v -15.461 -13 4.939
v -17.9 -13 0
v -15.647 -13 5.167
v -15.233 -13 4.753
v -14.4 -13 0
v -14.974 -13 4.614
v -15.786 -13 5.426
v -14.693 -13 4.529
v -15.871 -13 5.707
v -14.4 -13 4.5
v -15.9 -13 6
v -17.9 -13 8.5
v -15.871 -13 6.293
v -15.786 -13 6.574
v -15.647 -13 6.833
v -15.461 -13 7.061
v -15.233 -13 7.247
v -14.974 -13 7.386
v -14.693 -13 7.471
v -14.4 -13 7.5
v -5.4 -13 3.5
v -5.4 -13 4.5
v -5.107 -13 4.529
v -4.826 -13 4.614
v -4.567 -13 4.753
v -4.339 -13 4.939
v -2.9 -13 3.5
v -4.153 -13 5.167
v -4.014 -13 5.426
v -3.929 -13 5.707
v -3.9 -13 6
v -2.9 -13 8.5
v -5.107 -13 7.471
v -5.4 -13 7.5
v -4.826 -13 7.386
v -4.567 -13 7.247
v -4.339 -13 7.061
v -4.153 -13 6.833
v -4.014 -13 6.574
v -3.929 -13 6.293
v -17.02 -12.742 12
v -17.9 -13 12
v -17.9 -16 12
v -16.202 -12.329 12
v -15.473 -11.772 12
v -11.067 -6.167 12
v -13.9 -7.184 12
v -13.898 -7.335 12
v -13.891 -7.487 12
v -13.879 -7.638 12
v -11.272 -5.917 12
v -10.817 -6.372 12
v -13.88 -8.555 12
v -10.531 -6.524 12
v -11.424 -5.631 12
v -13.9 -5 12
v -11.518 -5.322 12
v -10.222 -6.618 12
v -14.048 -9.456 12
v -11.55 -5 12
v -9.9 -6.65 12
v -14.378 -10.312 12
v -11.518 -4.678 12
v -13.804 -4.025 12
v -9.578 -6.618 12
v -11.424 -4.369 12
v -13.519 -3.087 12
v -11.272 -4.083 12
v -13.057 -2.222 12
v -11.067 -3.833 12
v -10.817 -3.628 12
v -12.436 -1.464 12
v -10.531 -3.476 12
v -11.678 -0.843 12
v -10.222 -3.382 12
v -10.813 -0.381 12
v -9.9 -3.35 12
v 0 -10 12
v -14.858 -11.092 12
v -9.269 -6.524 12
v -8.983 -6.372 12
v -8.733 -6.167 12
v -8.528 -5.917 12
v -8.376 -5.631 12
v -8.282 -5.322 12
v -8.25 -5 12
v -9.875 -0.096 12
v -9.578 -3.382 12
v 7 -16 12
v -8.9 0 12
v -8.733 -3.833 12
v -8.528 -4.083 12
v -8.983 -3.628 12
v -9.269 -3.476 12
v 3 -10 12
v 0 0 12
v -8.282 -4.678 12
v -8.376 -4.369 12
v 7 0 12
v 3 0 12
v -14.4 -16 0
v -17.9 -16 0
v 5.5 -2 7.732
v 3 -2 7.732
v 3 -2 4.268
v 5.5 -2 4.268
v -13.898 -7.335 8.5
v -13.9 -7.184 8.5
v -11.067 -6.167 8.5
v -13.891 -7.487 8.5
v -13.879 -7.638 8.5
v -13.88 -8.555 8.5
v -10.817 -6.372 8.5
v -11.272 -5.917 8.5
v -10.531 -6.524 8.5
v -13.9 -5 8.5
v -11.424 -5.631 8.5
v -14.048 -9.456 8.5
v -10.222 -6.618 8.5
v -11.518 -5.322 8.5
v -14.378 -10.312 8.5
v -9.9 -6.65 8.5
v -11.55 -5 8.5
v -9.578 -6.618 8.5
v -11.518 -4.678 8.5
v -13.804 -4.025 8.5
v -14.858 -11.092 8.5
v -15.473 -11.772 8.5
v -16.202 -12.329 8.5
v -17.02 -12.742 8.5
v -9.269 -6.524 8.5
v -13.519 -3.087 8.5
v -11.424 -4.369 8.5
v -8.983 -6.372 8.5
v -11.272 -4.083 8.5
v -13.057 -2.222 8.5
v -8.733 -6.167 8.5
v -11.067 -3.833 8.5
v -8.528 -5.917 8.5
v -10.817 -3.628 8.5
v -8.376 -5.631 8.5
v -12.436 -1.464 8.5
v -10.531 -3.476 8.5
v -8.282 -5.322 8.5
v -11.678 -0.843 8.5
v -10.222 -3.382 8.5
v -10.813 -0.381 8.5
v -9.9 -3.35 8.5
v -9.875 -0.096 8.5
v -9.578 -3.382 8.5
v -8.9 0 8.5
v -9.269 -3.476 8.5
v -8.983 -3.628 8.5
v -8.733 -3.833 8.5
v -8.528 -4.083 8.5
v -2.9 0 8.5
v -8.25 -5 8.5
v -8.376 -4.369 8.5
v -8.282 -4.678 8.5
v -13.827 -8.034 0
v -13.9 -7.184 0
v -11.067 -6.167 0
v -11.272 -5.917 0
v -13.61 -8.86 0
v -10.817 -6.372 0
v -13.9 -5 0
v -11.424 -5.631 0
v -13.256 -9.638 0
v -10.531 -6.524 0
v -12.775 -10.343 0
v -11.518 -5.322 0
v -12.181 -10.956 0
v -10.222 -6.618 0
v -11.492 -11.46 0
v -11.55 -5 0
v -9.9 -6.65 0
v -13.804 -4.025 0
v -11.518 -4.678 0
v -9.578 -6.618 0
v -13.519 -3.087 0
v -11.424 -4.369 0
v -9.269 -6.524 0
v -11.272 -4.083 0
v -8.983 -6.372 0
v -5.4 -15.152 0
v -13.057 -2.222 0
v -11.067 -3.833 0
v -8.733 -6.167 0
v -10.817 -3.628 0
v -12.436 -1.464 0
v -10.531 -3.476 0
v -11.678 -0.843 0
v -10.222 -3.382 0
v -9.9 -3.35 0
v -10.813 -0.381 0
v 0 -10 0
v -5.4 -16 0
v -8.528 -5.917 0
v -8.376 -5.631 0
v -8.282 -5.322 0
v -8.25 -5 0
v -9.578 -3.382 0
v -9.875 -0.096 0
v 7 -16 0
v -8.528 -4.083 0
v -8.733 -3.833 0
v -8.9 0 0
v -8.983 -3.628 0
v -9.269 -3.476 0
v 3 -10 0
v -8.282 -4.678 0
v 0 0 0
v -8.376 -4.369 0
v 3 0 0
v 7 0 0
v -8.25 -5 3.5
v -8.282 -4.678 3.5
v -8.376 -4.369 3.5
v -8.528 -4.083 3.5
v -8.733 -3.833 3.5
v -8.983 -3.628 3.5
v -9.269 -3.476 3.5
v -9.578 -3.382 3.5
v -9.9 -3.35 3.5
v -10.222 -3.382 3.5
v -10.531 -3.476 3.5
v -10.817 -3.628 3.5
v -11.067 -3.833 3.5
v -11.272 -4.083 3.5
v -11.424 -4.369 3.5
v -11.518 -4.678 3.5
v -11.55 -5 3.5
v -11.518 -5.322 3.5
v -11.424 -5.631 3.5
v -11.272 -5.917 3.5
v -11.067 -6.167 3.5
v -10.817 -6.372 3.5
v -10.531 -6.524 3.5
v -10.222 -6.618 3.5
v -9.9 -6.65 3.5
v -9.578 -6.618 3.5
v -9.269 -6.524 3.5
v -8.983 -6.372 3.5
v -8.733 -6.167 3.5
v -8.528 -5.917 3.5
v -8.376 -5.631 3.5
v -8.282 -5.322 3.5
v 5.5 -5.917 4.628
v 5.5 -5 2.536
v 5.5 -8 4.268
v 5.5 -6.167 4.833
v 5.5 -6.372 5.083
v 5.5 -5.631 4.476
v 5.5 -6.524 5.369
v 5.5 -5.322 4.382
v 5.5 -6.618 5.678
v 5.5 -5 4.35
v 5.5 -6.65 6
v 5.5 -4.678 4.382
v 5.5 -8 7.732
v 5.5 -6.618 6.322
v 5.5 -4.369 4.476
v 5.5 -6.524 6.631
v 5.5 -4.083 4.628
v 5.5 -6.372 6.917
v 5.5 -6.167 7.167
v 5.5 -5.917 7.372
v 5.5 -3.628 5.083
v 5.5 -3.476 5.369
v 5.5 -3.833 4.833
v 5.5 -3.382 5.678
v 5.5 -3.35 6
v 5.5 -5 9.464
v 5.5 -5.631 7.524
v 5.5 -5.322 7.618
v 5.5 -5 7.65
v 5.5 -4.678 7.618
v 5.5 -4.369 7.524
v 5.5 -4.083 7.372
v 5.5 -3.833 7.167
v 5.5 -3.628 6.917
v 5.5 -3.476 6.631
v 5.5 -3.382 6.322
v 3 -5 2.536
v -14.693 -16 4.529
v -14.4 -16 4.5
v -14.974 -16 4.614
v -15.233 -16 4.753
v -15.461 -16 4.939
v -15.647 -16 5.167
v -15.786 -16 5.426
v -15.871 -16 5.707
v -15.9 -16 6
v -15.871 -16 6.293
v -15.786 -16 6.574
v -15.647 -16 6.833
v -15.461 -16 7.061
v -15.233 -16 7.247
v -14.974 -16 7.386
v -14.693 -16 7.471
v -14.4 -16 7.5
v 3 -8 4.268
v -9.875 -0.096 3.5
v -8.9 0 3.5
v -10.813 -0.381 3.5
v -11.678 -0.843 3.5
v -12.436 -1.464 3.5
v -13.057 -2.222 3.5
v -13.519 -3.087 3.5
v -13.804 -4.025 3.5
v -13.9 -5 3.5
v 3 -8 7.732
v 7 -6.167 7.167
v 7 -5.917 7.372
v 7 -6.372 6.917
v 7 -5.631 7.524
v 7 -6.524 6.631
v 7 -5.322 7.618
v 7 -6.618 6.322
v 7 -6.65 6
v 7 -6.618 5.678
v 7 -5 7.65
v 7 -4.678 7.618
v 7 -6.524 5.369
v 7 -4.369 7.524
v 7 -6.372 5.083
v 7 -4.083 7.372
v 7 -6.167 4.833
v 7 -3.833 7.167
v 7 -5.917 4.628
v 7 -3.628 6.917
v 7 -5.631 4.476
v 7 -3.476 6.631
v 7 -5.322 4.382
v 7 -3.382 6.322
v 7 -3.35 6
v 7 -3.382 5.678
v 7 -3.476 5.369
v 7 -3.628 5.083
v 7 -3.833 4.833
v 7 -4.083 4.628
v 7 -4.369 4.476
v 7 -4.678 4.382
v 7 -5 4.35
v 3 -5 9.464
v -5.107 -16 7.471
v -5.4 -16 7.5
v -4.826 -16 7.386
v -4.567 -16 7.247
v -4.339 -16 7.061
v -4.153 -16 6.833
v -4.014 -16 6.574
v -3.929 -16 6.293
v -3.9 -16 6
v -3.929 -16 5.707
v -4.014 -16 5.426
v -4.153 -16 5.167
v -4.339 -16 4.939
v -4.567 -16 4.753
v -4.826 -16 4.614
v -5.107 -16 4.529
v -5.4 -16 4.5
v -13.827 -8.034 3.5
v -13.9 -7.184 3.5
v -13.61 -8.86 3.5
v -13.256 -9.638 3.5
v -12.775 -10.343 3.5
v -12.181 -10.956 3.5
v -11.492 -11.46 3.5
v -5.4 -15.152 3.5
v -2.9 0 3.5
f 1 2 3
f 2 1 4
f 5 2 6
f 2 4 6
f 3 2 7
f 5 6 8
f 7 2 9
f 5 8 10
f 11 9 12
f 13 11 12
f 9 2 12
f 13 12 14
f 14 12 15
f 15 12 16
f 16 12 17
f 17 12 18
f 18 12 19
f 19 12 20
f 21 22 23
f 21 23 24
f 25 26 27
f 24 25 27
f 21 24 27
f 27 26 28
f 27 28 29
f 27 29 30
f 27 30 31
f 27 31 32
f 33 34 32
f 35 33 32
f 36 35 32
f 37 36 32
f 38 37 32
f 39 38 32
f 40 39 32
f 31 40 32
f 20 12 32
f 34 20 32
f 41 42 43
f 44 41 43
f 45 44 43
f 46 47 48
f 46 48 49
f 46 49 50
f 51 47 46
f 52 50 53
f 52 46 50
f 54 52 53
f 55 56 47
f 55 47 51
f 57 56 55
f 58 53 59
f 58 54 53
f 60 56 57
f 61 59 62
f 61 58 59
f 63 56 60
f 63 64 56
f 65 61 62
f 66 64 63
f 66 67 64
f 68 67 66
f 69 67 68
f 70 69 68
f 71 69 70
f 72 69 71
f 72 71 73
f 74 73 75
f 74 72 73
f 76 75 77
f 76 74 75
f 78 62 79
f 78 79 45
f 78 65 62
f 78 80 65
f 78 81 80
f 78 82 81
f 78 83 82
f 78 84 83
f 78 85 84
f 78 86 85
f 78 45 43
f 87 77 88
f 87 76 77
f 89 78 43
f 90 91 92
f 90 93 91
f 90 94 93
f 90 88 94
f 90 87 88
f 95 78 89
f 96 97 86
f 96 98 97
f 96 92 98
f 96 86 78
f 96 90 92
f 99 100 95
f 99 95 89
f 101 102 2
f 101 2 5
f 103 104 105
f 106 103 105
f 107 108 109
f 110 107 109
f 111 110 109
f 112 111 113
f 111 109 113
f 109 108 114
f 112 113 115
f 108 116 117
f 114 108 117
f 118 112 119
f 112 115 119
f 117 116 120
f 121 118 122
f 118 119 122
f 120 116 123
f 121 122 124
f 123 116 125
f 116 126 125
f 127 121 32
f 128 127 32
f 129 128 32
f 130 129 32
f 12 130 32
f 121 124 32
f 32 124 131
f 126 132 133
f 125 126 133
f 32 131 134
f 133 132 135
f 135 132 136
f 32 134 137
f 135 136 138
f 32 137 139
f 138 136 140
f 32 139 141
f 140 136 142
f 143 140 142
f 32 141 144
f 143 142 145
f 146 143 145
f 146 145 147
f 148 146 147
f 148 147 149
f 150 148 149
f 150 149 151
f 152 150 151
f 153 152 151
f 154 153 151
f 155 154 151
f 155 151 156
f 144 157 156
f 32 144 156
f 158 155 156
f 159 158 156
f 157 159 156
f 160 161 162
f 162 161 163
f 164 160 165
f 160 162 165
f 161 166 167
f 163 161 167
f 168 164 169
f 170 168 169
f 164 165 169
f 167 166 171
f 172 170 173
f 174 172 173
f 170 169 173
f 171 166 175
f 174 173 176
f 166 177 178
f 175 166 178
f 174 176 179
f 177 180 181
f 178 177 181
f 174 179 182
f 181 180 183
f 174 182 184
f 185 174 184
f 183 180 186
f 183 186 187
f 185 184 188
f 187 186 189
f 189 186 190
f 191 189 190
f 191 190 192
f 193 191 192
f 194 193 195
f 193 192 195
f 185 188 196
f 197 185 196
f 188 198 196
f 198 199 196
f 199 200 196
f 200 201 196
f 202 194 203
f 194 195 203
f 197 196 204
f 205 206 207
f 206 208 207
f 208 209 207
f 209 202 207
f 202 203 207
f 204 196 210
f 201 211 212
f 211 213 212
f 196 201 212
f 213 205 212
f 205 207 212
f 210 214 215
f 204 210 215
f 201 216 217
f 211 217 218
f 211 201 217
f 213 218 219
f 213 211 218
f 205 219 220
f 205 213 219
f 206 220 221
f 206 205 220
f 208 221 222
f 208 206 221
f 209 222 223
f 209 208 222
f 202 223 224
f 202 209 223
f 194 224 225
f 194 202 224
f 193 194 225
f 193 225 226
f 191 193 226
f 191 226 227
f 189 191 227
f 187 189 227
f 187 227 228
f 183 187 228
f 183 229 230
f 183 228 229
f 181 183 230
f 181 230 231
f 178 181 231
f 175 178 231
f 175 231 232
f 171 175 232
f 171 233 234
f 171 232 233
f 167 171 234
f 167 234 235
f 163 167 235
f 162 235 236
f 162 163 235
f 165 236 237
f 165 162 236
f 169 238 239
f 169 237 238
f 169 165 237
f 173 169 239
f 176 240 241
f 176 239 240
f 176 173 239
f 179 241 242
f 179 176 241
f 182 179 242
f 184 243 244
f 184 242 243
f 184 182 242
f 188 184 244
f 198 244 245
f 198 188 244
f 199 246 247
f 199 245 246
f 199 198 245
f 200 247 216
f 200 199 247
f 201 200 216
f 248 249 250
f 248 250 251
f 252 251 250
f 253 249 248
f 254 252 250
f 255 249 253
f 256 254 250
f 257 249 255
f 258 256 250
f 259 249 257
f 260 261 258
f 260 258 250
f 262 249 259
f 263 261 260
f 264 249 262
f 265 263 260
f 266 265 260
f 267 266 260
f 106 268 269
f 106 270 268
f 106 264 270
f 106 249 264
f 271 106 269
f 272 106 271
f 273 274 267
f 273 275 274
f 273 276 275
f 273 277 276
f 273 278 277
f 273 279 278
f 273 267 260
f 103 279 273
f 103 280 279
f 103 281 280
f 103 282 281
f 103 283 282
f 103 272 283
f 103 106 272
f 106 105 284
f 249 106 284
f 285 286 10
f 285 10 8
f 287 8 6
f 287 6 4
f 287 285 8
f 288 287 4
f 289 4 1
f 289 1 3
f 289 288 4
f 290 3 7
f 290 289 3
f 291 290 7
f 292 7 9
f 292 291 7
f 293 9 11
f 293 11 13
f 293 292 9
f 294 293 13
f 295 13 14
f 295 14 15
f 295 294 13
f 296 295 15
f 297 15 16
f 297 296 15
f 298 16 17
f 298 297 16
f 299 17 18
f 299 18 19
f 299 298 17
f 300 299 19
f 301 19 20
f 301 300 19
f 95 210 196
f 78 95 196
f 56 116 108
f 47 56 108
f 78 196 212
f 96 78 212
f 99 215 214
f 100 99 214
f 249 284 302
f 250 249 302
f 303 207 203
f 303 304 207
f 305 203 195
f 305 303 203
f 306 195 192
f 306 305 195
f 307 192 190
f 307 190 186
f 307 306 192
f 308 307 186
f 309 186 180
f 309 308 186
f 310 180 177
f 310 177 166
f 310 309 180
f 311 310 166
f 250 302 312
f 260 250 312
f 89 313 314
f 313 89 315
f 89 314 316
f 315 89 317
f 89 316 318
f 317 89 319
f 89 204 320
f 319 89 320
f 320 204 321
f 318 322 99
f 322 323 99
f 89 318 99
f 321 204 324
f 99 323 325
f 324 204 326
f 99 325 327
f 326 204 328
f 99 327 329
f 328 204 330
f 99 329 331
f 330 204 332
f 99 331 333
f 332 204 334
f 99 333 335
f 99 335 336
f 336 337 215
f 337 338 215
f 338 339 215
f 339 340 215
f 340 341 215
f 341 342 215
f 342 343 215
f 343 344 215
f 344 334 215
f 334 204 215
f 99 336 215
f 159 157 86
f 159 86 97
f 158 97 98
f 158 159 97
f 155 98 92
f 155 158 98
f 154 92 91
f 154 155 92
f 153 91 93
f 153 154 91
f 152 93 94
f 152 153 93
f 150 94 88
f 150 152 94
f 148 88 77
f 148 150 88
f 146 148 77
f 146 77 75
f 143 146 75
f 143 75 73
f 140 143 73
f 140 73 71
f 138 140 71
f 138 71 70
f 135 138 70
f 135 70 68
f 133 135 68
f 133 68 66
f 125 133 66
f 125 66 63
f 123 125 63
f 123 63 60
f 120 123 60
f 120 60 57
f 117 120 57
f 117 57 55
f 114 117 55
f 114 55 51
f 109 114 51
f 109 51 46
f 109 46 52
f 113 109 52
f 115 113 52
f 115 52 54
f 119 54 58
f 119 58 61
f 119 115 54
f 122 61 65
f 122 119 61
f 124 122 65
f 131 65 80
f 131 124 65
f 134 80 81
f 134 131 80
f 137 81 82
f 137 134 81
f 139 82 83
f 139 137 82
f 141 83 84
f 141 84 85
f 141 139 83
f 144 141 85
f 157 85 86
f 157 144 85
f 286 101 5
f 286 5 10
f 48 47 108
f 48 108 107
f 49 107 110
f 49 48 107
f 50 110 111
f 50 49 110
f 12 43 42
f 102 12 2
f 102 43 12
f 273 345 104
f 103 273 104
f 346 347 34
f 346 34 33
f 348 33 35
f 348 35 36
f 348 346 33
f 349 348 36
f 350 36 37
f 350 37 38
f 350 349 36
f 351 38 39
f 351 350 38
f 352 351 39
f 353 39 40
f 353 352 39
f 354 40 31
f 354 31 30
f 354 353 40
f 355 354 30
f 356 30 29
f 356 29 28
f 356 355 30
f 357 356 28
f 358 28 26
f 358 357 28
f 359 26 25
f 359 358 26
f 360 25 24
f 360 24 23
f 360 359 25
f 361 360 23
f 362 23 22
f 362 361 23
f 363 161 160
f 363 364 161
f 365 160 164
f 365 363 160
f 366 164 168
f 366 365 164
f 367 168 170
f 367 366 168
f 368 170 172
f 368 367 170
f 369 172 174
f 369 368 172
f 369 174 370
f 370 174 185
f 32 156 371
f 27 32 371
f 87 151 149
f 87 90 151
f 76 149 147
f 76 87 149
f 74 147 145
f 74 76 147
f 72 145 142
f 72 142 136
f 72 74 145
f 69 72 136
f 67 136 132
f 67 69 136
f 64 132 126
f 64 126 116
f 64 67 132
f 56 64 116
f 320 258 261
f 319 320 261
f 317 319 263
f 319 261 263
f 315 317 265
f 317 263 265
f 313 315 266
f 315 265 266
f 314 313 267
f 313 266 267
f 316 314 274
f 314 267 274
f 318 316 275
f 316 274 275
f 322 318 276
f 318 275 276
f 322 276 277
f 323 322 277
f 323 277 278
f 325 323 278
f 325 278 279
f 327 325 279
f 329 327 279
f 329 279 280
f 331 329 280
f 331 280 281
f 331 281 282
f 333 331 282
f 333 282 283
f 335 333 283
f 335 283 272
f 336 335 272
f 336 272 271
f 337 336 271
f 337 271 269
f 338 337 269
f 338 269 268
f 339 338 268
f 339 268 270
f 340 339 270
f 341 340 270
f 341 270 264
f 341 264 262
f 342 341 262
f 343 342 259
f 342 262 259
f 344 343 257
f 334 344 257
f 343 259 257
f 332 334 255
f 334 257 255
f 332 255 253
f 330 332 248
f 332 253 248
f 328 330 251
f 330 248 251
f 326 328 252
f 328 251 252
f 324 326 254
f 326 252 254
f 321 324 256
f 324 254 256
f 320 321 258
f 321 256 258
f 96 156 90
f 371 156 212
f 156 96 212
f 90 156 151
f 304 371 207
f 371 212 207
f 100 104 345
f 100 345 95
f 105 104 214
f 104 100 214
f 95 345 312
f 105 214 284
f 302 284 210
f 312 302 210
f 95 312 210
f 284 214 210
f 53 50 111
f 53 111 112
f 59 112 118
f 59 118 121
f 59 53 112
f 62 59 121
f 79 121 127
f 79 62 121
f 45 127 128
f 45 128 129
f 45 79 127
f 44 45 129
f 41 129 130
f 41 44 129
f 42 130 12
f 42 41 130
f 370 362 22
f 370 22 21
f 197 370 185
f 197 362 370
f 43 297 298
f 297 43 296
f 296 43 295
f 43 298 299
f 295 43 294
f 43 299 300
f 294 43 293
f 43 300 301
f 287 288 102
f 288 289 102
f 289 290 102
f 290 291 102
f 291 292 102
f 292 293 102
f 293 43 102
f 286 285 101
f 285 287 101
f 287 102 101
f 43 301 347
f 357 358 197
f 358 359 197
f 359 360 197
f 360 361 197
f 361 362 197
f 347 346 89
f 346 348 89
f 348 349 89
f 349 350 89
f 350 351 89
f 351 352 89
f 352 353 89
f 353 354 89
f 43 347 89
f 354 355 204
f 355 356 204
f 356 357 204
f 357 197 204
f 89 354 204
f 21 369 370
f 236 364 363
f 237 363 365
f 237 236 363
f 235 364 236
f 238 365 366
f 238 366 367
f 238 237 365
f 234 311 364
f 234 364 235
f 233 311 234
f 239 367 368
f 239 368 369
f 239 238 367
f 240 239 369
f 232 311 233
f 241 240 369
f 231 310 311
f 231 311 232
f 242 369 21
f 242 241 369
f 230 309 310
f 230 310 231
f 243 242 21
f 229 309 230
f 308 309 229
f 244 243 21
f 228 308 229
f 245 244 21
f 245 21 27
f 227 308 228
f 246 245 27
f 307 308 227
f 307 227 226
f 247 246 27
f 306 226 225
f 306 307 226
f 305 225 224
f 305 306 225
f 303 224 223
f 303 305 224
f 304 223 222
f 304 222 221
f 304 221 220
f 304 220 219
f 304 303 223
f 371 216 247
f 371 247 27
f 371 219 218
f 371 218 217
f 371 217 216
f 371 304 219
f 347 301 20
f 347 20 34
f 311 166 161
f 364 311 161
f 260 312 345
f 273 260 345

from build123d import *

# Parameters (mm, degrees)
ESBO_O1_R                = 1.65
RESSALTO_EXTRUS_O1_DEPTH = 12
ESBO_O2_W                = 11
ESBO_O2_H                = 5
CORTE_EXTRUS_O1_DEPTH    = 25.355902775
FILETE1_R                = 5
ESBO_O3_R                = 1.65
CORTE_EXTRUS_O2_DEPTH    = 2.5
ESBO_O3_2_R              = 1.65
CORTE_EXTRUS_O3_DEPTH    = 27.184155514
RESSALTO_EXTRUS_O2_DEPTH = 3
FILETE2_R                = 5


with BuildPart() as part:
    # Esboço1 → Ressalto-extrusão1 (new body)
    with BuildSketch(Plane.XY):
        Polygon((0, 0), (-13.9, 0), (-13.9, -10), (-4, -16), (7, -16), (7, 0), (3, 0), (3, -10), (0, -10), align=None)
        with Locations((-9.9, -5)):
            Circle(ESBO_O1_R, mode=Mode.SUBTRACT)
    extrude(amount=RESSALTO_EXTRUS_O1_DEPTH)

    # Esboço2 → Corte-extrusão1 (cut, through all)
    with BuildSketch(Plane(origin=(0, 0, 0), x_dir=(1, 0, 0), z_dir=(0, 1, 0))):
        with Locations((-8.4, -6)):
            Rectangle(ESBO_O2_W, ESBO_O2_H)
    extrude(amount=-CORTE_EXTRUS_O1_DEPTH, mode=Mode.SUBTRACT)

    # Filete1
    filete1_edges = [part.edges().sort_by_distance(p)[0] for p in [
        (-4, -16, 1.75),
        (-13.9, -10, 10.25),
        (-13.9, -10, 1.75),
        (-13.9, 0, 1.75),
        (-13.9, 0, 10.25),
    ]]
    fillet(filete1_edges, radius=FILETE1_R)

    # Esboço3 → Corte-extrusão2 (cut)
    with BuildSketch(Plane.ZY.offset(-3)):
        Polygon((2.535898385, -5), (4.267949192, -8), (7.732050808, -8), (9.464101615, -5), (7.732050808, -2), (4.267949192, -2), align=None)
        with Locations(Location((6, -5, 0), (0, 0, 270))):
            Circle(ESBO_O3_R, mode=Mode.SUBTRACT)
    extrude(amount=-CORTE_EXTRUS_O2_DEPTH, mode=Mode.SUBTRACT)

    # Esboço3<2> → Corte-extrusão3 (cut, through all)
    with BuildSketch(Plane.ZY.offset(-3)):
        with Locations(Location((6, -5, 0), (0, 0, 270))):
            Circle(ESBO_O3_2_R)
    extrude(amount=-CORTE_EXTRUS_O3_DEPTH, mode=Mode.SUBTRACT)

    # Esboço4 → Ressalto-extrusão2 (add)
    with BuildSketch(Plane.XZ.offset(16)):
        with BuildLine():
            Line((7, 12), (-17.9, 12))
            Line((-17.9, 12), (-17.9, 0))
            Line((-17.9, 0), (-14.4, 0))
            Line((-14.4, 0), (-14.4, 4.5))
            ThreePointArc((-14.4, 4.5), (-15.9, 6), (-14.4, 7.5))
            Line((-14.4, 7.5), (-5.4, 7.5))
            ThreePointArc((-5.4, 7.5), (-3.9, 6), (-5.4, 4.5))
            Line((-5.4, 4.5), (-5.4, 0))
            Line((-5.4, 0), (7, 0))
            Line((7, 0), (7, 12))
        make_face()
    extrude(amount=-RESSALTO_EXTRUS_O2_DEPTH)

    # Filete2
    # the kernel refuses this fillet: 5 mm, written as the material it adds along each edge
    with BuildSketch(Plane(origin=(-8.95, -13, 12), x_dir=(-1, 0, 0), z_dir=(0, 0, -1))) as filete2_piece_1:
        with BuildLine():
            CenterArc((9.908595848, 4.907249128), FILETE2_R, 174.784336803, 84.162533203)
            Line((4.929297924, 5.361773258), (4.431368132, 5.407225671))
            ThreePointArc((4.431368132, 5.407225671), (2.282357722, 1.967907146), (-0.259150858, 0.427598916))
            Line((-0.259150858, 0.427598916), (0, -0.5))
            ThreePointArc((0, -0.5), (4.475, -0.5), (8.854140415, -0.490724913))
            Line((8.854140415, -0.490724913), (8.95, 0))
        make_face()
    extrude(amount=3.5)


solid = part.part
